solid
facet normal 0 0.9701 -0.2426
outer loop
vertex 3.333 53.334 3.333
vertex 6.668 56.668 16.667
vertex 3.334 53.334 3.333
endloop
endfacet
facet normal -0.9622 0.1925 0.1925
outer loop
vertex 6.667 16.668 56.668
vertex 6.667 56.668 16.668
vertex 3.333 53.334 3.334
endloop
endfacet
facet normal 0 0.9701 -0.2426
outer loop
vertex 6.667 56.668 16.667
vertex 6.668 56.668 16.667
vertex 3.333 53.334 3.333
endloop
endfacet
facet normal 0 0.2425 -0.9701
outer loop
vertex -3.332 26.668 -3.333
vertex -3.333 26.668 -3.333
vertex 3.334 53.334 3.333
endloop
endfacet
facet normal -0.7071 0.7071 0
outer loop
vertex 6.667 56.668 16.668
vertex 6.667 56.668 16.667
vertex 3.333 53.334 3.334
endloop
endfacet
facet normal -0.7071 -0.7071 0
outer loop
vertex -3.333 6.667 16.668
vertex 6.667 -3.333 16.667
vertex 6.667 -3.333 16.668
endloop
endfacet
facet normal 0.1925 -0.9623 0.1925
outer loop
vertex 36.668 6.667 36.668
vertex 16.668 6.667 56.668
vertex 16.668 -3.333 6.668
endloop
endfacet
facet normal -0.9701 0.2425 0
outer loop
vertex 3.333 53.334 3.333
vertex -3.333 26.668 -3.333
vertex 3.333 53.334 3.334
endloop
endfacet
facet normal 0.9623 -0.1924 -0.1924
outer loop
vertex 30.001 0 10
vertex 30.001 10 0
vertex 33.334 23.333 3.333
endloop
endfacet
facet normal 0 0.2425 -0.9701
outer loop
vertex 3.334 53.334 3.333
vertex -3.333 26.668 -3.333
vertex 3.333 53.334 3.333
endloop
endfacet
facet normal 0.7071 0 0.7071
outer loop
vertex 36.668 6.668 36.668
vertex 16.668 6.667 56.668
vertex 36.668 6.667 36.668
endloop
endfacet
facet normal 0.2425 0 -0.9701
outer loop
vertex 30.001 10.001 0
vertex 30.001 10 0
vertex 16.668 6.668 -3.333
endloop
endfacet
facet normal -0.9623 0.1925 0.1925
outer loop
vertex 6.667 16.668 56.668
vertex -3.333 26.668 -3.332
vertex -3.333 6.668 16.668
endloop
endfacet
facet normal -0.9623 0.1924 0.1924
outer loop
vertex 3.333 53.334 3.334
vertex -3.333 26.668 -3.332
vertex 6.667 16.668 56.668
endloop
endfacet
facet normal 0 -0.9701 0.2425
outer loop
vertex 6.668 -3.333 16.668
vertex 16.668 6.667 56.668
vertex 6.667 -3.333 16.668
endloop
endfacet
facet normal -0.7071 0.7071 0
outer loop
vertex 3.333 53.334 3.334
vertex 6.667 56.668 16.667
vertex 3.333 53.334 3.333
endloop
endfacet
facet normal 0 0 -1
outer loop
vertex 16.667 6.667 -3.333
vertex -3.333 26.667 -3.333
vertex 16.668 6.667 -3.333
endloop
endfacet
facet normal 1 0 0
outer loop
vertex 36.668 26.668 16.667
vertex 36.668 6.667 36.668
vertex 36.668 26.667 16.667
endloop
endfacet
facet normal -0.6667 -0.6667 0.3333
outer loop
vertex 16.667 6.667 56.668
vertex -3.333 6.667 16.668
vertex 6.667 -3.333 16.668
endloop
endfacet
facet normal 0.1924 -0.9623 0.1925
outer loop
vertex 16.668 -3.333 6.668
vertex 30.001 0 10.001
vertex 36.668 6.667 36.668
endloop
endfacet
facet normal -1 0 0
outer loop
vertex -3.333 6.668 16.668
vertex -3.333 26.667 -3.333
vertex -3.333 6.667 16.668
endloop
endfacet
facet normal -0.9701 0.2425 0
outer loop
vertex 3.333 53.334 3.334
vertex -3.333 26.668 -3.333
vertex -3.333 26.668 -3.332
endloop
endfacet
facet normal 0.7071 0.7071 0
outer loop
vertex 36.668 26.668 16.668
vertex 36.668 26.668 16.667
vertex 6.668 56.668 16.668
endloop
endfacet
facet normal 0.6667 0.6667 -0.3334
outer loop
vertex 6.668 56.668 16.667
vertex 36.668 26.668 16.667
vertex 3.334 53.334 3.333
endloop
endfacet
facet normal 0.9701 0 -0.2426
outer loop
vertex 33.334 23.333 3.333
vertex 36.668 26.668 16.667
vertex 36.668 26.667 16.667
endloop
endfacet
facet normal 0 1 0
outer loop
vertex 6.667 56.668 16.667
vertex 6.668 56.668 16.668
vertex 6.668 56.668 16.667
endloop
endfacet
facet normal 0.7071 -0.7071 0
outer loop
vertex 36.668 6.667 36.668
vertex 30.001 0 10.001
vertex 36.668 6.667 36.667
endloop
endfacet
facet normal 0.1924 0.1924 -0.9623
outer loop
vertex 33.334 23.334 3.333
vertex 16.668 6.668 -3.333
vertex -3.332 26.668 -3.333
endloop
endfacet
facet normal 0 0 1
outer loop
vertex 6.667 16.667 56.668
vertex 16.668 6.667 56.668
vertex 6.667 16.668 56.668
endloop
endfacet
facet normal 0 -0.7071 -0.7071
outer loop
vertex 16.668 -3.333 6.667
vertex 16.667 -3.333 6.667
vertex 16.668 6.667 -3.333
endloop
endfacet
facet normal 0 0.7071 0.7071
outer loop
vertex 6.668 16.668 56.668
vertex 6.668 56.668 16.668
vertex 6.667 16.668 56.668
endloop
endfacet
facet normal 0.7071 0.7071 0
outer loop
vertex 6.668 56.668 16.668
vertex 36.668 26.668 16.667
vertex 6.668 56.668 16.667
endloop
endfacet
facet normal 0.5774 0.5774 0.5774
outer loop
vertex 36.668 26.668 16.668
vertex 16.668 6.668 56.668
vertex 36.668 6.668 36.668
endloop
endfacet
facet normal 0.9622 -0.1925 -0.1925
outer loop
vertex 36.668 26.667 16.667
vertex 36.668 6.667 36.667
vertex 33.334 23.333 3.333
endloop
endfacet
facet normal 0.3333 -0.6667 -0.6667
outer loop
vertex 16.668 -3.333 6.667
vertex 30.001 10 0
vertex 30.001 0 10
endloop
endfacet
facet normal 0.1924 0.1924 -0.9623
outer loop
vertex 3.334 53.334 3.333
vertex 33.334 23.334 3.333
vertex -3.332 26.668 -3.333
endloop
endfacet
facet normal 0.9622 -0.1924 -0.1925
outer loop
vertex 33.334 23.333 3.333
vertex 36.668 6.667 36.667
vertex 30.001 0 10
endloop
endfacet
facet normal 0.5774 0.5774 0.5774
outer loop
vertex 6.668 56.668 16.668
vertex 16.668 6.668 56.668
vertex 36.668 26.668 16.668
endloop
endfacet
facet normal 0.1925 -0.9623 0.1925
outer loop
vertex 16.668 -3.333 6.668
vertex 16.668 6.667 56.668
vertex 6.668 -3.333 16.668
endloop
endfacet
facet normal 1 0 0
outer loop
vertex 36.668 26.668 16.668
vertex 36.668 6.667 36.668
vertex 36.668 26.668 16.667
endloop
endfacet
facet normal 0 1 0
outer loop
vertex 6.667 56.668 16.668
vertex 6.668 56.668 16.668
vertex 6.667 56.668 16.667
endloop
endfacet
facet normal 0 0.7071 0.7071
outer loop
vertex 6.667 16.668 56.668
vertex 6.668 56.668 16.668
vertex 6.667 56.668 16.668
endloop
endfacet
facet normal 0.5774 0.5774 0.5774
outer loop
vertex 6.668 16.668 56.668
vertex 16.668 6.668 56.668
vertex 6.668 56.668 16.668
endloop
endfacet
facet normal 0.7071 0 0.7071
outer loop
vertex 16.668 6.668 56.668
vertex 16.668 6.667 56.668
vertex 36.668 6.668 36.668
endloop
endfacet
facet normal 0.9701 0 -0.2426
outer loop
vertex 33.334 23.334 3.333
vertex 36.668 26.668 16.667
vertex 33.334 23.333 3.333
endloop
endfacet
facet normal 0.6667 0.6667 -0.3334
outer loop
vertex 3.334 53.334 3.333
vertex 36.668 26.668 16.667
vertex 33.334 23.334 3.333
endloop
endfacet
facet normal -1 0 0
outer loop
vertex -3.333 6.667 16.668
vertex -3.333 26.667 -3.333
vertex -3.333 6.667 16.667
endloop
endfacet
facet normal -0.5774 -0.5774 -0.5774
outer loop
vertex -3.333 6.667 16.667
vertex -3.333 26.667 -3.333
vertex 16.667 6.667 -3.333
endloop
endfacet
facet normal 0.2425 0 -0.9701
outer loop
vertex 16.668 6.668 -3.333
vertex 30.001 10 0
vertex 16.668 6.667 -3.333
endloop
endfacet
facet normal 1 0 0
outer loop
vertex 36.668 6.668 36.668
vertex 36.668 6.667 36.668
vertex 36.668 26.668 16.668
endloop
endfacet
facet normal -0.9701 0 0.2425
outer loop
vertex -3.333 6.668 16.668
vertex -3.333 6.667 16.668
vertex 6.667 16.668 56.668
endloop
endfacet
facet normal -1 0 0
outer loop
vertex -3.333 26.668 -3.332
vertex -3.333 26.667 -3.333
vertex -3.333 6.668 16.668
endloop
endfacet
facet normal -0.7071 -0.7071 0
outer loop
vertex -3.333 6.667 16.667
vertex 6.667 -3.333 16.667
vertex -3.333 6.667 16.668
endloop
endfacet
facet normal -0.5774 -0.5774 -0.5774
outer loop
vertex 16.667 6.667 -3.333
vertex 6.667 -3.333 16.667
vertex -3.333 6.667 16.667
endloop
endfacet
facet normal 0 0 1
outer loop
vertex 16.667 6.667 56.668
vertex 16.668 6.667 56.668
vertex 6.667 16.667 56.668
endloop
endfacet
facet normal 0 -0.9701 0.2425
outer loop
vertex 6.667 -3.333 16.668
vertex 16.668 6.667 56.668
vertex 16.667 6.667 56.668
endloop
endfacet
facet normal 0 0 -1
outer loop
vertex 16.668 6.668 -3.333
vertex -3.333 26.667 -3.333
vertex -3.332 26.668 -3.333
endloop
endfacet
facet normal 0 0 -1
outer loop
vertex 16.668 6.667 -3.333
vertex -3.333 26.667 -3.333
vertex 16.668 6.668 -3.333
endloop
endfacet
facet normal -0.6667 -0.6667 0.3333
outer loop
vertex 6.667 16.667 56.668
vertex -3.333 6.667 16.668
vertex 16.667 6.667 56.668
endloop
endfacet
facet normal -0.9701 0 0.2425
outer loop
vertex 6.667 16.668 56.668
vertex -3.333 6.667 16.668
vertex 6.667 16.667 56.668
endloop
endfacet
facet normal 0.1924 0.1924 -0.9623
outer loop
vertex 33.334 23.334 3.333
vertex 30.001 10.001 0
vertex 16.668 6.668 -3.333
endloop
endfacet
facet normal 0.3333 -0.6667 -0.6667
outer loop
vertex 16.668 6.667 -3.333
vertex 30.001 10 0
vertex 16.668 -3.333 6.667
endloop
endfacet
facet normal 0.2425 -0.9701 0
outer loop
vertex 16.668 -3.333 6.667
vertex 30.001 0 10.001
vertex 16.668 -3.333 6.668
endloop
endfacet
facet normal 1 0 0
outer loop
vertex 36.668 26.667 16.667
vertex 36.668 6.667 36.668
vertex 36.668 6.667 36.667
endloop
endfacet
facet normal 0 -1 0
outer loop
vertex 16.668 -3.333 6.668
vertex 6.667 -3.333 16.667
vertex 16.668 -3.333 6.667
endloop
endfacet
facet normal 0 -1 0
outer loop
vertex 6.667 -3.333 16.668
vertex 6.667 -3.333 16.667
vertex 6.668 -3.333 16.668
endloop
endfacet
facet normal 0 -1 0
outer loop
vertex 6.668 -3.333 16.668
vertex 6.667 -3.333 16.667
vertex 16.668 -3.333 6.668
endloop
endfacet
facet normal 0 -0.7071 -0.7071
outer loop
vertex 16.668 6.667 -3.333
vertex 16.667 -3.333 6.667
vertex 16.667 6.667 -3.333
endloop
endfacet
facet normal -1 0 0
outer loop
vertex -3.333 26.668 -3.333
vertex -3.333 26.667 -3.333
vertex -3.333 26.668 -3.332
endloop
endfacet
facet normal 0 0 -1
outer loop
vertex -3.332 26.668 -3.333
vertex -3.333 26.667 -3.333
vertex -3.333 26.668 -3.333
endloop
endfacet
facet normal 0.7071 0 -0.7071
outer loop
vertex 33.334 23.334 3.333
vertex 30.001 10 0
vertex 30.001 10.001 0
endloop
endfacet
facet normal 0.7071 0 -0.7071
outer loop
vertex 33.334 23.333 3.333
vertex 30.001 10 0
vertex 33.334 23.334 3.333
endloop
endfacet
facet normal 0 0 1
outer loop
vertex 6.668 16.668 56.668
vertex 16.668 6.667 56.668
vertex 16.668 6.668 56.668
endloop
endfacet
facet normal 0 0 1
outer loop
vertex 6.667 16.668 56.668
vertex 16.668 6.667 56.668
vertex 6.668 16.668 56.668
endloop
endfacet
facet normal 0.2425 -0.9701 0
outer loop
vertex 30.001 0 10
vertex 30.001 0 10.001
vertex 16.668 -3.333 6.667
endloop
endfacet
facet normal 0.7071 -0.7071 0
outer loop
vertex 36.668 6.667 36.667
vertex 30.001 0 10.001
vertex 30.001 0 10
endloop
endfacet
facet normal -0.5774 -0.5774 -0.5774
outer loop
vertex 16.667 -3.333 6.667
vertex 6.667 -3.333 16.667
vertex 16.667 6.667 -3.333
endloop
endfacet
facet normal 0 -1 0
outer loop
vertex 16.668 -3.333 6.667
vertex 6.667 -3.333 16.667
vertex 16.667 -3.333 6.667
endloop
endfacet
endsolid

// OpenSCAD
module convex_poly(l) {
     hull() { for (point=l) translate (point) cube(0.0001); }
};

// compute the sum of a list of vectors
function sum_vects(l) = (len(l) == 0) ? [0,0,0] :
     sum_vects([for (i = [0:1:len(l)-2]) l[i]]) + l[len(l)-1];

// Todo : generate with a rec module
perm4 = [[3, 2, 4, 1],
 [2, 3, 1, 4],
 [3, 1, 4, 2],
 [3, 1, 2, 4],
 [4, 3, 2, 1],
 [4, 3, 1, 2],
 [4, 2, 1, 3],
 [4, 1, 2, 3],
 [4, 1, 3, 2],
 [4, 2, 3, 1],
 [3, 2, 1, 4],
 [3, 4, 1, 2],
 [1, 3, 2, 4],
 [2, 1, 3, 4],
 [2, 4, 1, 3],
 [1, 4, 3, 2],
 [1, 4, 2, 3],
 [2, 4, 3, 1],
 [3, 4, 2, 1],
 [1, 3, 4, 2],
 [1, 2, 3, 4],
 [2, 3, 4, 1],
 [2, 1, 4, 3],
 [1, 2, 4, 3]];
     
assneg4 = [[3, 1, 2, 4],
 [3, 2, 1, 4],
 [4, 2, 1, 3],
 [4, 3, 2, 1],
 [4, 1, 4, 1],
 [4, 3, 1, 2],
 [4, 1, 2, 3],
 [1, 4, 1, 4],
 [1, 6, 2, 1],
 [1, 6, 1, 2],
 [2, 1, 6, 1],
 [1, 2, 6, 1],
 [1, 2, 3, 4],
 [2, 1, 3, 4]];
 
asspos4 = [[1, 2, 4, 3],
 [1, 4, 3, 2],
 [4, 3, 2, 1],
 [3, 4, 2, 1],
 [3, 4, -1, 4],
 [2, 4, 3, 1],
 [4, 3, -1, 4],
 [2, 3, 4, 1],
 [1, 4, 1, 4],
 [4, 1, 4, 1],
 [1, 2, 3, 4],
 [1, 3, 4, 2],
 [4, -1, 4, 3],
 [4, -1, 3, 4]];
 
 assmix4 = [[3, 4, 1, 2],
 [4, 3, 1, 2],
 [1, 3, 2, 4],
 [4, 3, 2, 1],
 [3, 4, 2, 1],
 [4, 1, 1, 4],
 [1, 4, 4, 1],
 [1, 4, 2, 3],
 [2, 4, 1, 3],
 [1, 2, 6, 1],
 [2, 3, 1, 4],
 [1, 2, 3, 4],
 [4, -1, 6, 1],
 [4, -1, 3, 4]];
     
permtreepos4 = [[4, 1, 1, 4],
 [3, 4, 2, 1],
 [1, 4, 3, 2],
 [4, 3, 2, 1],
 [4, 3, -1, 4],
 [4, 1, 3, 2],
 [2, 4, 3, 1],
 [4, 2, 3, 1],
 [1, 4, 1, 4],
 [3, 2, 4, 1],
 [3, 4, -1, 4],
 [2, 3, 4, 1],
 [2, 1, 3, 4],
 [3, 1, 4, 2],
 [1, 2, 3, 4],
 [1, 3, 4, 2],
 [2, 1, 4, 3],
 [1, 2, 4, 3]];
 
permtreeneg4 = [[2, 1, 3, 4],
 [1, 4, 4, 1],
 [2, 4, 1, 3],
 [1, 4, 2, 3],
 [4, 1, 4, 1],
 [2, 1, 6, 1],
 [3, 4, 1, 2],
 [4, 3, 1, 2],
 [4, 1, 2, 3],
 [4, 2, 1, 3],
 [4, 3, 2, 1],
 [1, 3, 2, 4],
 [3, 4, 2, 1],
 [2, 3, 1, 4],
 [3, 1, 2, 4],
 [3, 2, 1, 4],
 [1, 2, 6, 1],
 [1, 2, 3, 4]];
 
 Cube4 = [[1, 2, 3, 4],
 [1, 6, -1, 4],
 [4, 3, 2, 1],
 [1, 6, 2, 1],
 [1, 2, 6, 1],
 [4, -1, 6, 1],
 [4, -1, 3, 4],
 [4, 3, -1, 4]];
 
 permcube4 = [[2, 1, 3, 4],
 [3, 4, 2, 1],
 [4, 1, 4, 1],
 [4, 3, 2, 1],
 [1, 2, 3, 4],
 [1, 4, 4, 1],
 [1, 4, 1, 4],
 [1, 2, 6, 1],
 [2, 1, 6, 1],
 [4, 3, -1, 4],
 [4, 1, 1, 4],
 [3, 4, -1, 4]];
 
 asscube4 = [[4, 1, 1, 4],
 [1, 4, 1, 4],
 [4, 3, 1, 2],
 [4, 3, 2, 1],
 [1, 6, 2, 1],
 [1, 6, 1, 2],
 [4, -1, 6, 1],
 [1, 2, 6, 1],
 [1, 2, 3, 4],
 [4, -1, 3, 4]];


// projection matrix 4D -> 3D
projmatrix = [[1, 0, 0], [0, 1, 0], [0, 0, 1], [-1/3, -1/3, -1/3]];

//scale(10) convex_poly([for (p=perm4) p * projmatrix]);
//scale(10) convex_poly([for (p=permtreepos4) p * projmatrix]);
scale(10) convex_poly([for (p=assneg4) p * projmatrix]);
//scale(10) convex_poly([for (p=asspos4) p * projmatrix]);
//scale(10) convex_poly([for (p=permtreeneg4) p * projmatrix]);
//scale(10) convex_poly([for (p=Cube4) p * projmatrix]);
//scale(10) convex_poly([for (p=permcube4) p * projmatrix]);
//scale(10) convex_poly([for (p=asscube4) p * projmatrix]);
//scale(10) convex_poly([for (p=assmix4) p * projmatrix]);
